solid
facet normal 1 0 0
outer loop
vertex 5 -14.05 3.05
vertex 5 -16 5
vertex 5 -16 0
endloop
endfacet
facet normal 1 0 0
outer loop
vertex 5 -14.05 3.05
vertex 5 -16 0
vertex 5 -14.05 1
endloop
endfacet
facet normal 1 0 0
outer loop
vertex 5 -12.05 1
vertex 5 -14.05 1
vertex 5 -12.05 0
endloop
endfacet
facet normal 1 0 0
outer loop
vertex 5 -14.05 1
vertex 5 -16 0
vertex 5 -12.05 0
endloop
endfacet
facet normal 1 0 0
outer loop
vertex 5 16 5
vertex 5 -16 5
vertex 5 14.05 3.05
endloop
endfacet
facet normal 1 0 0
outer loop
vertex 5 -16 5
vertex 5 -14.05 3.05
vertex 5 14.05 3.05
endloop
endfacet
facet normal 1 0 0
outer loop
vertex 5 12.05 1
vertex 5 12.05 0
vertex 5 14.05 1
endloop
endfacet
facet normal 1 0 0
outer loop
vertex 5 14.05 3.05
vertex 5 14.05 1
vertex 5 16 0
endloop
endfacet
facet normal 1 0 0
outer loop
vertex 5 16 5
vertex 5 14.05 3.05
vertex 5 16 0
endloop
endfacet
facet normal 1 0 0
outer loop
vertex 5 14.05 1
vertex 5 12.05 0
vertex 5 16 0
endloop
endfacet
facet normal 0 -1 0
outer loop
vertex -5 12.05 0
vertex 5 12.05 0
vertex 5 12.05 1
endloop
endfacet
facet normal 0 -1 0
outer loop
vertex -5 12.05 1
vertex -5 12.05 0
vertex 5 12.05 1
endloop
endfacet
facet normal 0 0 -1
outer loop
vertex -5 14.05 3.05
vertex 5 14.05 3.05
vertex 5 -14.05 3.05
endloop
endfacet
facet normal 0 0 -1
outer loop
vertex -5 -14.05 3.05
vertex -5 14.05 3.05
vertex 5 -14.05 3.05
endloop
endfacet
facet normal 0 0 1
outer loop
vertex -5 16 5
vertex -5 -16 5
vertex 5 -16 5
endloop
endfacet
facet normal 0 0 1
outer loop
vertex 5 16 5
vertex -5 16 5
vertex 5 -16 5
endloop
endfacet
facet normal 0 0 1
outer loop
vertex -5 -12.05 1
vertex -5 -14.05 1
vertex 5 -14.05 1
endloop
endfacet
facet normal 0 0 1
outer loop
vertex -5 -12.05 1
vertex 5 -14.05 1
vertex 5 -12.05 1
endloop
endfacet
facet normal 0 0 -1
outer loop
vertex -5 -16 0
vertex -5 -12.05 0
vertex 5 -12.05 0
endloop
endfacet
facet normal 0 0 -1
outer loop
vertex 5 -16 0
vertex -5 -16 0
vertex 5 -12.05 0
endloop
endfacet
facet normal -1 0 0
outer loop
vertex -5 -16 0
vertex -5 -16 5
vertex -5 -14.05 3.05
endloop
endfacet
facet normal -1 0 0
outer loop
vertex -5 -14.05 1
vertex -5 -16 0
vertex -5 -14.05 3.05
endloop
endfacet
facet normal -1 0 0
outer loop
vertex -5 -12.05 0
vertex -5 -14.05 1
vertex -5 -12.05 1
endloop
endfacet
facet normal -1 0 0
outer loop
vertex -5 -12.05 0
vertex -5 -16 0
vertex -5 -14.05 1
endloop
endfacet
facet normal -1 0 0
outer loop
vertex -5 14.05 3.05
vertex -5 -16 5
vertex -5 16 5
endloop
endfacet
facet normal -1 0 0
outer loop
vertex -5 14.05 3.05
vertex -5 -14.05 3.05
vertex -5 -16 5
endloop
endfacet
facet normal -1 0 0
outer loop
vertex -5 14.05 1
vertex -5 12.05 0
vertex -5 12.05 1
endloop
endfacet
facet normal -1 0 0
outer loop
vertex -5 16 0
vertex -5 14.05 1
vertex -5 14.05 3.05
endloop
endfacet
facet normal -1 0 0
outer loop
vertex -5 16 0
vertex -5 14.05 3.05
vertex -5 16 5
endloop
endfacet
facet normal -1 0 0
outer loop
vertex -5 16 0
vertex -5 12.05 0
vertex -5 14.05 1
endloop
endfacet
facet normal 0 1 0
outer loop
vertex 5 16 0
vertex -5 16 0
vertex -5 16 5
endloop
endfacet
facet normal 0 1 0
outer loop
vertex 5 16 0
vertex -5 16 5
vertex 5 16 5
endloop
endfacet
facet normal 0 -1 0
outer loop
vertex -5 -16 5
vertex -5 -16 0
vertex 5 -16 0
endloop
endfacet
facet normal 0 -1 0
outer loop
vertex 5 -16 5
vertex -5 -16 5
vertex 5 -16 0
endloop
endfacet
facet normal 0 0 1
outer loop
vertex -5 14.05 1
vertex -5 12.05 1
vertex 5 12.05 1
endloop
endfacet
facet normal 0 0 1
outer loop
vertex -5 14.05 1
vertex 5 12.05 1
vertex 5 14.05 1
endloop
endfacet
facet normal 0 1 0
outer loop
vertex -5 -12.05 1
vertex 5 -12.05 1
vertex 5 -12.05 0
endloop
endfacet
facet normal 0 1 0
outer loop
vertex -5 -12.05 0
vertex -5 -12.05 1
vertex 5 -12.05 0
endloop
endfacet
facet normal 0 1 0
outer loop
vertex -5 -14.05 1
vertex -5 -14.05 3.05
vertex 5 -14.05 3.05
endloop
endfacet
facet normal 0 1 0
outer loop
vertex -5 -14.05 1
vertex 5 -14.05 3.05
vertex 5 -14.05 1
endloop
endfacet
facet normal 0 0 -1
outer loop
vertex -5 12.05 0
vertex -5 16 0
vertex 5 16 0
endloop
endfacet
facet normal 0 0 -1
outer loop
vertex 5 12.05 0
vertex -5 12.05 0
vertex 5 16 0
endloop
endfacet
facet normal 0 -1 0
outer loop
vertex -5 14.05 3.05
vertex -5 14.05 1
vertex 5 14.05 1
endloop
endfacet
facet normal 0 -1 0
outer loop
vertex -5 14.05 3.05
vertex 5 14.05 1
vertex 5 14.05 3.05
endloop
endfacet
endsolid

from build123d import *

# Parameters (mm, degrees)
F0_W     = 10
F0_H     = 32
F1_DEPTH = 5
F3_DEPTH = 10.001


with BuildPart() as f1:
    # F0 (on Top) → F1 (new body)
    with BuildSketch(Plane.XY):
        Rectangle(F0_W, F0_H)
    extrude(amount=F1_DEPTH)

    # F2 (on face) → F3 (cut, through all)
    with BuildSketch(Plane.YZ.offset(5)):
        Polygon((-12.05, 1), (-12.05, 0), (12.05, 0), (12.05, 1), (14.05, 1), (14.05, 3.05), (-14.05, 3.05), (-14.05, 1), align=None)
    extrude(amount=-F3_DEPTH, mode=Mode.SUBTRACT)


solid = f1.part
